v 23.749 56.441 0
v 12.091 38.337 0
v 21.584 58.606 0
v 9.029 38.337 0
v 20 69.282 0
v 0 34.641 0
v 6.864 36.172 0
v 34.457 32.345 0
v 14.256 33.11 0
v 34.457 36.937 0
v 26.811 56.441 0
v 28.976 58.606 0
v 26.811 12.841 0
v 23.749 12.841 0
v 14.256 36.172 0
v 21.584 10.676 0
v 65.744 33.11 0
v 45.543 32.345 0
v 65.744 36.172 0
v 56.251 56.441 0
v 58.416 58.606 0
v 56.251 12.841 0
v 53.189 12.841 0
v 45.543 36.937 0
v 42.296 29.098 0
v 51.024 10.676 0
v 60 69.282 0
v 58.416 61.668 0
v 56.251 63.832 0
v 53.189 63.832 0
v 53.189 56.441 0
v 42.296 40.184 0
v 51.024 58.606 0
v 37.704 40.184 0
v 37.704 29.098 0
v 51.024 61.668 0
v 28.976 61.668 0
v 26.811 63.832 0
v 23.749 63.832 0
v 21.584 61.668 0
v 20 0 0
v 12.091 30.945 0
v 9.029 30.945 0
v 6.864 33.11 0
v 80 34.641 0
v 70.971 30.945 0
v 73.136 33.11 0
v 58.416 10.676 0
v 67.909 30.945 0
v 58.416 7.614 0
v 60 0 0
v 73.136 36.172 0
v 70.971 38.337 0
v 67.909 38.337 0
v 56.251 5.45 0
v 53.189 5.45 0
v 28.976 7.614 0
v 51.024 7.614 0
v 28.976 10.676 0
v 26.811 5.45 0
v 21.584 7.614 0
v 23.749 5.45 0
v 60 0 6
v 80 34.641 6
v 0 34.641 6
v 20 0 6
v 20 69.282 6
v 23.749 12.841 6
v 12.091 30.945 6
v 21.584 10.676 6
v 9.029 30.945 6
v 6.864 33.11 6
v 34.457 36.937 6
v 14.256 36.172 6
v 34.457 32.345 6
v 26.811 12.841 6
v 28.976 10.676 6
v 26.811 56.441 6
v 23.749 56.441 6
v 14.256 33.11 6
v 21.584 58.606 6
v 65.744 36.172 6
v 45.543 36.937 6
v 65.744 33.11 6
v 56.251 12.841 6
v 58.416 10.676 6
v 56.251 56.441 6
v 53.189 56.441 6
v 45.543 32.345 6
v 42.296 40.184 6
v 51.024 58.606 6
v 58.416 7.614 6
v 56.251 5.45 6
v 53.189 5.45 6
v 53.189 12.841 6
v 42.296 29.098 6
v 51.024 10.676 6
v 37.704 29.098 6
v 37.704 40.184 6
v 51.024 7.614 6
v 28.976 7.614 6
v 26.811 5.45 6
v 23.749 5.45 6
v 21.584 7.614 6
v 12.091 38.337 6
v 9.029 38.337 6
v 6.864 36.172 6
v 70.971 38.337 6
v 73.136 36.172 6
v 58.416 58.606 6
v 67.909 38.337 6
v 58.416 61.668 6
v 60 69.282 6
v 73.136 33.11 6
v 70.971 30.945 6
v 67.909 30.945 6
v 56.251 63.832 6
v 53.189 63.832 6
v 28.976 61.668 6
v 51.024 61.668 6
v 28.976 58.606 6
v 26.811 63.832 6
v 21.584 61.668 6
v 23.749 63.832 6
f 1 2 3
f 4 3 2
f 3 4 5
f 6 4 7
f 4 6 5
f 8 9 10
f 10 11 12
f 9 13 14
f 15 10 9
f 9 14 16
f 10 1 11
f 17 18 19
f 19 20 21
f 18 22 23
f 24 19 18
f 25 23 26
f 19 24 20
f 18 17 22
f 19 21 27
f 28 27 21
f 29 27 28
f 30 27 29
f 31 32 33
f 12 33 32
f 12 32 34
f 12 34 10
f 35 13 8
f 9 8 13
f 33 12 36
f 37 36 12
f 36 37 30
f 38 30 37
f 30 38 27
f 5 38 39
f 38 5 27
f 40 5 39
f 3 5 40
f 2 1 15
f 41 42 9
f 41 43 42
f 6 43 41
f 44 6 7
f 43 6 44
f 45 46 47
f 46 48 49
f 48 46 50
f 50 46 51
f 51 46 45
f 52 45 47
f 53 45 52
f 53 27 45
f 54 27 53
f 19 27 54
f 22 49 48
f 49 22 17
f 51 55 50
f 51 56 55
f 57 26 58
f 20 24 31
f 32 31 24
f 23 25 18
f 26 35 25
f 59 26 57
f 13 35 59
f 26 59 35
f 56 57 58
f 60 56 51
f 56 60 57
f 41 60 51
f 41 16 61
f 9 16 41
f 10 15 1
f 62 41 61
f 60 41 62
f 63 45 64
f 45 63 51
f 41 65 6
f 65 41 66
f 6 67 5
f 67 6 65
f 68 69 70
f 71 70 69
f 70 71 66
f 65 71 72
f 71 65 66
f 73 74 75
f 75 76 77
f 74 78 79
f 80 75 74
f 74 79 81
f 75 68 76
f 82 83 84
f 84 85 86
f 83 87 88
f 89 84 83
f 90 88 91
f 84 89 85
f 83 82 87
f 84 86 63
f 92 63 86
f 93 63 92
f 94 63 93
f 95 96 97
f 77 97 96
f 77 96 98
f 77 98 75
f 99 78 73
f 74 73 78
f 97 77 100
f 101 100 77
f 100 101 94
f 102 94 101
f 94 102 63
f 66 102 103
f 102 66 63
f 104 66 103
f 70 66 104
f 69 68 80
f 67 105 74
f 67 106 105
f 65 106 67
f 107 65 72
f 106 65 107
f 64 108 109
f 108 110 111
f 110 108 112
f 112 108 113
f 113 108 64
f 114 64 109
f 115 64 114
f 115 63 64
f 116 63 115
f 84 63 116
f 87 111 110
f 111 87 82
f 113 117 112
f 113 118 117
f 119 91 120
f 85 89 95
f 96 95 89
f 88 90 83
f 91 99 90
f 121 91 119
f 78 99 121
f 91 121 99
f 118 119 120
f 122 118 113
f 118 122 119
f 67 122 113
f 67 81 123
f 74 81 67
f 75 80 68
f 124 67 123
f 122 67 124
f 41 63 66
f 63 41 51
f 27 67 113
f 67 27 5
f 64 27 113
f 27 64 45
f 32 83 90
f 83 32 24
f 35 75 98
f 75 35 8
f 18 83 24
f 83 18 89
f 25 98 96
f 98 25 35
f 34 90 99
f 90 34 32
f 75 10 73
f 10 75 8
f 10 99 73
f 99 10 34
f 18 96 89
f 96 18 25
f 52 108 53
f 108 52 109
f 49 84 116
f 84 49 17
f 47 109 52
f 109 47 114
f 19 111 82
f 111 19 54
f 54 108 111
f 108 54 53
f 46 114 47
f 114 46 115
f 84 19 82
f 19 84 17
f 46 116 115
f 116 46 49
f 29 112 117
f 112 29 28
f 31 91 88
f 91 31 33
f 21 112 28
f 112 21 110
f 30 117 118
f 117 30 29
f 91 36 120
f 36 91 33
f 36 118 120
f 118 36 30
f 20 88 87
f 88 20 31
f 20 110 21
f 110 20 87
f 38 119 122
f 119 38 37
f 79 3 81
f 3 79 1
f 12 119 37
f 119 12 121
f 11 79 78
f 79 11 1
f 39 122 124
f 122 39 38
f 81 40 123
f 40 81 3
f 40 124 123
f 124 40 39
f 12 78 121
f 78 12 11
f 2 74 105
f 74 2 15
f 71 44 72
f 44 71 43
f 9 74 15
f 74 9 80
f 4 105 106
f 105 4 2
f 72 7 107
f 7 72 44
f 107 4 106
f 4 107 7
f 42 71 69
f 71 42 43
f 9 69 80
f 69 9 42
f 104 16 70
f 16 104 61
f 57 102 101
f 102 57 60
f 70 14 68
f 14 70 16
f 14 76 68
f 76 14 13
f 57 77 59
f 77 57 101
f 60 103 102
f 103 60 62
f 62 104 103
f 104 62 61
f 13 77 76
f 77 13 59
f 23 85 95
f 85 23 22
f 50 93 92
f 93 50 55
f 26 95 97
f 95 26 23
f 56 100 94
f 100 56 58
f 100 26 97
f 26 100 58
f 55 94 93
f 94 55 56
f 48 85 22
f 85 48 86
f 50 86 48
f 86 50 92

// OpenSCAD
$fn = 32;

// ----------------------------------------------------------------------
// Polygon plate: 6-gon R40, 6 bolt windows
// ----------------------------------------------------------------------

// --- parameters (mm) ---
sides = 6;                // number of polygon sides
plate_r = 40;             // circumscribed radius of the polygon
bore_r = 6;               // centre bore radius
bolts = 6;                // number of bolt windows
ring_r = 29.44;           // bolt-circle radius
bolt_r = 4;               // bolt window radius
plate_t = 6;              // plate thickness, Z (extrusion height)
fit_tol = 0.1;            // declared fit tolerance (prompt contract)
free_tol = 0.5;           // declared free tolerance (prompt contract)

plate_d = 2 * plate_r;  // circumscribed diameter
bore_d = 2 * bore_r;  // centre bore diameter
bolt_d = 2 * bolt_r;  // bolt window diameter
ring_d = 2 * ring_r;  // bolt-circle diameter

profile = [[80, 34.641], [60, 69.282], [20, 69.282], [0, 34.641], [20, 0], [60, 0]];  // primary outline, 6 points, counter clockwise
void_1 = [[45.543, 36.937], [42.296, 40.184], [37.704, 40.184], [34.457, 36.937], [34.457, 32.345], [37.704, 29.098], [42.296, 29.098], [45.543, 32.345]];  // centre bore, 8 points
void_2 = [[73.136, 36.172], [70.971, 38.337], [67.909, 38.337], [65.744, 36.172], [65.744, 33.11], [67.909, 30.945], [70.971, 30.945], [73.136, 33.11]];  // bolt window 1, 8 points
void_3 = [[58.416, 61.668], [56.251, 63.832], [53.189, 63.832], [51.024, 61.668], [51.024, 58.606], [53.189, 56.441], [56.251, 56.441], [58.416, 58.606]];  // bolt window 2, 8 points
void_4 = [[28.976, 61.668], [26.811, 63.832], [23.749, 63.832], [21.584, 61.668], [21.584, 58.606], [23.749, 56.441], [26.811, 56.441], [28.976, 58.606]];  // bolt window 3, 8 points
void_5 = [[14.256, 36.172], [12.091, 38.337], [9.029, 38.337], [6.864, 36.172], [6.864, 33.11], [9.029, 30.945], [12.091, 30.945], [14.256, 33.11]];  // bolt window 4, 8 points
void_6 = [[28.976, 10.676], [26.811, 12.841], [23.749, 12.841], [21.584, 10.676], [21.584, 7.614], [23.749, 5.45], [26.811, 5.45], [28.976, 7.614]];  // bolt window 5, 8 points
void_7 = [[58.416, 10.676], [56.251, 12.841], [53.189, 12.841], [51.024, 10.676], [51.024, 7.614], [53.189, 5.45], [56.251, 5.45], [58.416, 7.614]];  // bolt window 6, 8 points

// --- the one profile operation ---
difference() {
  linear_extrude(height = plate_t) polygon(points = profile);
  translate([0, 0, -1])
    linear_extrude(height = plate_t + 2) polygon(points = void_1);
  translate([0, 0, -1])
    linear_extrude(height = plate_t + 2) polygon(points = void_2);
  translate([0, 0, -1])
    linear_extrude(height = plate_t + 2) polygon(points = void_3);
  translate([0, 0, -1])
    linear_extrude(height = plate_t + 2) polygon(points = void_4);
  translate([0, 0, -1])
    linear_extrude(height = plate_t + 2) polygon(points = void_5);
  translate([0, 0, -1])
    linear_extrude(height = plate_t + 2) polygon(points = void_6);
  translate([0, 0, -1])
    linear_extrude(height = plate_t + 2) polygon(points = void_7);
}
